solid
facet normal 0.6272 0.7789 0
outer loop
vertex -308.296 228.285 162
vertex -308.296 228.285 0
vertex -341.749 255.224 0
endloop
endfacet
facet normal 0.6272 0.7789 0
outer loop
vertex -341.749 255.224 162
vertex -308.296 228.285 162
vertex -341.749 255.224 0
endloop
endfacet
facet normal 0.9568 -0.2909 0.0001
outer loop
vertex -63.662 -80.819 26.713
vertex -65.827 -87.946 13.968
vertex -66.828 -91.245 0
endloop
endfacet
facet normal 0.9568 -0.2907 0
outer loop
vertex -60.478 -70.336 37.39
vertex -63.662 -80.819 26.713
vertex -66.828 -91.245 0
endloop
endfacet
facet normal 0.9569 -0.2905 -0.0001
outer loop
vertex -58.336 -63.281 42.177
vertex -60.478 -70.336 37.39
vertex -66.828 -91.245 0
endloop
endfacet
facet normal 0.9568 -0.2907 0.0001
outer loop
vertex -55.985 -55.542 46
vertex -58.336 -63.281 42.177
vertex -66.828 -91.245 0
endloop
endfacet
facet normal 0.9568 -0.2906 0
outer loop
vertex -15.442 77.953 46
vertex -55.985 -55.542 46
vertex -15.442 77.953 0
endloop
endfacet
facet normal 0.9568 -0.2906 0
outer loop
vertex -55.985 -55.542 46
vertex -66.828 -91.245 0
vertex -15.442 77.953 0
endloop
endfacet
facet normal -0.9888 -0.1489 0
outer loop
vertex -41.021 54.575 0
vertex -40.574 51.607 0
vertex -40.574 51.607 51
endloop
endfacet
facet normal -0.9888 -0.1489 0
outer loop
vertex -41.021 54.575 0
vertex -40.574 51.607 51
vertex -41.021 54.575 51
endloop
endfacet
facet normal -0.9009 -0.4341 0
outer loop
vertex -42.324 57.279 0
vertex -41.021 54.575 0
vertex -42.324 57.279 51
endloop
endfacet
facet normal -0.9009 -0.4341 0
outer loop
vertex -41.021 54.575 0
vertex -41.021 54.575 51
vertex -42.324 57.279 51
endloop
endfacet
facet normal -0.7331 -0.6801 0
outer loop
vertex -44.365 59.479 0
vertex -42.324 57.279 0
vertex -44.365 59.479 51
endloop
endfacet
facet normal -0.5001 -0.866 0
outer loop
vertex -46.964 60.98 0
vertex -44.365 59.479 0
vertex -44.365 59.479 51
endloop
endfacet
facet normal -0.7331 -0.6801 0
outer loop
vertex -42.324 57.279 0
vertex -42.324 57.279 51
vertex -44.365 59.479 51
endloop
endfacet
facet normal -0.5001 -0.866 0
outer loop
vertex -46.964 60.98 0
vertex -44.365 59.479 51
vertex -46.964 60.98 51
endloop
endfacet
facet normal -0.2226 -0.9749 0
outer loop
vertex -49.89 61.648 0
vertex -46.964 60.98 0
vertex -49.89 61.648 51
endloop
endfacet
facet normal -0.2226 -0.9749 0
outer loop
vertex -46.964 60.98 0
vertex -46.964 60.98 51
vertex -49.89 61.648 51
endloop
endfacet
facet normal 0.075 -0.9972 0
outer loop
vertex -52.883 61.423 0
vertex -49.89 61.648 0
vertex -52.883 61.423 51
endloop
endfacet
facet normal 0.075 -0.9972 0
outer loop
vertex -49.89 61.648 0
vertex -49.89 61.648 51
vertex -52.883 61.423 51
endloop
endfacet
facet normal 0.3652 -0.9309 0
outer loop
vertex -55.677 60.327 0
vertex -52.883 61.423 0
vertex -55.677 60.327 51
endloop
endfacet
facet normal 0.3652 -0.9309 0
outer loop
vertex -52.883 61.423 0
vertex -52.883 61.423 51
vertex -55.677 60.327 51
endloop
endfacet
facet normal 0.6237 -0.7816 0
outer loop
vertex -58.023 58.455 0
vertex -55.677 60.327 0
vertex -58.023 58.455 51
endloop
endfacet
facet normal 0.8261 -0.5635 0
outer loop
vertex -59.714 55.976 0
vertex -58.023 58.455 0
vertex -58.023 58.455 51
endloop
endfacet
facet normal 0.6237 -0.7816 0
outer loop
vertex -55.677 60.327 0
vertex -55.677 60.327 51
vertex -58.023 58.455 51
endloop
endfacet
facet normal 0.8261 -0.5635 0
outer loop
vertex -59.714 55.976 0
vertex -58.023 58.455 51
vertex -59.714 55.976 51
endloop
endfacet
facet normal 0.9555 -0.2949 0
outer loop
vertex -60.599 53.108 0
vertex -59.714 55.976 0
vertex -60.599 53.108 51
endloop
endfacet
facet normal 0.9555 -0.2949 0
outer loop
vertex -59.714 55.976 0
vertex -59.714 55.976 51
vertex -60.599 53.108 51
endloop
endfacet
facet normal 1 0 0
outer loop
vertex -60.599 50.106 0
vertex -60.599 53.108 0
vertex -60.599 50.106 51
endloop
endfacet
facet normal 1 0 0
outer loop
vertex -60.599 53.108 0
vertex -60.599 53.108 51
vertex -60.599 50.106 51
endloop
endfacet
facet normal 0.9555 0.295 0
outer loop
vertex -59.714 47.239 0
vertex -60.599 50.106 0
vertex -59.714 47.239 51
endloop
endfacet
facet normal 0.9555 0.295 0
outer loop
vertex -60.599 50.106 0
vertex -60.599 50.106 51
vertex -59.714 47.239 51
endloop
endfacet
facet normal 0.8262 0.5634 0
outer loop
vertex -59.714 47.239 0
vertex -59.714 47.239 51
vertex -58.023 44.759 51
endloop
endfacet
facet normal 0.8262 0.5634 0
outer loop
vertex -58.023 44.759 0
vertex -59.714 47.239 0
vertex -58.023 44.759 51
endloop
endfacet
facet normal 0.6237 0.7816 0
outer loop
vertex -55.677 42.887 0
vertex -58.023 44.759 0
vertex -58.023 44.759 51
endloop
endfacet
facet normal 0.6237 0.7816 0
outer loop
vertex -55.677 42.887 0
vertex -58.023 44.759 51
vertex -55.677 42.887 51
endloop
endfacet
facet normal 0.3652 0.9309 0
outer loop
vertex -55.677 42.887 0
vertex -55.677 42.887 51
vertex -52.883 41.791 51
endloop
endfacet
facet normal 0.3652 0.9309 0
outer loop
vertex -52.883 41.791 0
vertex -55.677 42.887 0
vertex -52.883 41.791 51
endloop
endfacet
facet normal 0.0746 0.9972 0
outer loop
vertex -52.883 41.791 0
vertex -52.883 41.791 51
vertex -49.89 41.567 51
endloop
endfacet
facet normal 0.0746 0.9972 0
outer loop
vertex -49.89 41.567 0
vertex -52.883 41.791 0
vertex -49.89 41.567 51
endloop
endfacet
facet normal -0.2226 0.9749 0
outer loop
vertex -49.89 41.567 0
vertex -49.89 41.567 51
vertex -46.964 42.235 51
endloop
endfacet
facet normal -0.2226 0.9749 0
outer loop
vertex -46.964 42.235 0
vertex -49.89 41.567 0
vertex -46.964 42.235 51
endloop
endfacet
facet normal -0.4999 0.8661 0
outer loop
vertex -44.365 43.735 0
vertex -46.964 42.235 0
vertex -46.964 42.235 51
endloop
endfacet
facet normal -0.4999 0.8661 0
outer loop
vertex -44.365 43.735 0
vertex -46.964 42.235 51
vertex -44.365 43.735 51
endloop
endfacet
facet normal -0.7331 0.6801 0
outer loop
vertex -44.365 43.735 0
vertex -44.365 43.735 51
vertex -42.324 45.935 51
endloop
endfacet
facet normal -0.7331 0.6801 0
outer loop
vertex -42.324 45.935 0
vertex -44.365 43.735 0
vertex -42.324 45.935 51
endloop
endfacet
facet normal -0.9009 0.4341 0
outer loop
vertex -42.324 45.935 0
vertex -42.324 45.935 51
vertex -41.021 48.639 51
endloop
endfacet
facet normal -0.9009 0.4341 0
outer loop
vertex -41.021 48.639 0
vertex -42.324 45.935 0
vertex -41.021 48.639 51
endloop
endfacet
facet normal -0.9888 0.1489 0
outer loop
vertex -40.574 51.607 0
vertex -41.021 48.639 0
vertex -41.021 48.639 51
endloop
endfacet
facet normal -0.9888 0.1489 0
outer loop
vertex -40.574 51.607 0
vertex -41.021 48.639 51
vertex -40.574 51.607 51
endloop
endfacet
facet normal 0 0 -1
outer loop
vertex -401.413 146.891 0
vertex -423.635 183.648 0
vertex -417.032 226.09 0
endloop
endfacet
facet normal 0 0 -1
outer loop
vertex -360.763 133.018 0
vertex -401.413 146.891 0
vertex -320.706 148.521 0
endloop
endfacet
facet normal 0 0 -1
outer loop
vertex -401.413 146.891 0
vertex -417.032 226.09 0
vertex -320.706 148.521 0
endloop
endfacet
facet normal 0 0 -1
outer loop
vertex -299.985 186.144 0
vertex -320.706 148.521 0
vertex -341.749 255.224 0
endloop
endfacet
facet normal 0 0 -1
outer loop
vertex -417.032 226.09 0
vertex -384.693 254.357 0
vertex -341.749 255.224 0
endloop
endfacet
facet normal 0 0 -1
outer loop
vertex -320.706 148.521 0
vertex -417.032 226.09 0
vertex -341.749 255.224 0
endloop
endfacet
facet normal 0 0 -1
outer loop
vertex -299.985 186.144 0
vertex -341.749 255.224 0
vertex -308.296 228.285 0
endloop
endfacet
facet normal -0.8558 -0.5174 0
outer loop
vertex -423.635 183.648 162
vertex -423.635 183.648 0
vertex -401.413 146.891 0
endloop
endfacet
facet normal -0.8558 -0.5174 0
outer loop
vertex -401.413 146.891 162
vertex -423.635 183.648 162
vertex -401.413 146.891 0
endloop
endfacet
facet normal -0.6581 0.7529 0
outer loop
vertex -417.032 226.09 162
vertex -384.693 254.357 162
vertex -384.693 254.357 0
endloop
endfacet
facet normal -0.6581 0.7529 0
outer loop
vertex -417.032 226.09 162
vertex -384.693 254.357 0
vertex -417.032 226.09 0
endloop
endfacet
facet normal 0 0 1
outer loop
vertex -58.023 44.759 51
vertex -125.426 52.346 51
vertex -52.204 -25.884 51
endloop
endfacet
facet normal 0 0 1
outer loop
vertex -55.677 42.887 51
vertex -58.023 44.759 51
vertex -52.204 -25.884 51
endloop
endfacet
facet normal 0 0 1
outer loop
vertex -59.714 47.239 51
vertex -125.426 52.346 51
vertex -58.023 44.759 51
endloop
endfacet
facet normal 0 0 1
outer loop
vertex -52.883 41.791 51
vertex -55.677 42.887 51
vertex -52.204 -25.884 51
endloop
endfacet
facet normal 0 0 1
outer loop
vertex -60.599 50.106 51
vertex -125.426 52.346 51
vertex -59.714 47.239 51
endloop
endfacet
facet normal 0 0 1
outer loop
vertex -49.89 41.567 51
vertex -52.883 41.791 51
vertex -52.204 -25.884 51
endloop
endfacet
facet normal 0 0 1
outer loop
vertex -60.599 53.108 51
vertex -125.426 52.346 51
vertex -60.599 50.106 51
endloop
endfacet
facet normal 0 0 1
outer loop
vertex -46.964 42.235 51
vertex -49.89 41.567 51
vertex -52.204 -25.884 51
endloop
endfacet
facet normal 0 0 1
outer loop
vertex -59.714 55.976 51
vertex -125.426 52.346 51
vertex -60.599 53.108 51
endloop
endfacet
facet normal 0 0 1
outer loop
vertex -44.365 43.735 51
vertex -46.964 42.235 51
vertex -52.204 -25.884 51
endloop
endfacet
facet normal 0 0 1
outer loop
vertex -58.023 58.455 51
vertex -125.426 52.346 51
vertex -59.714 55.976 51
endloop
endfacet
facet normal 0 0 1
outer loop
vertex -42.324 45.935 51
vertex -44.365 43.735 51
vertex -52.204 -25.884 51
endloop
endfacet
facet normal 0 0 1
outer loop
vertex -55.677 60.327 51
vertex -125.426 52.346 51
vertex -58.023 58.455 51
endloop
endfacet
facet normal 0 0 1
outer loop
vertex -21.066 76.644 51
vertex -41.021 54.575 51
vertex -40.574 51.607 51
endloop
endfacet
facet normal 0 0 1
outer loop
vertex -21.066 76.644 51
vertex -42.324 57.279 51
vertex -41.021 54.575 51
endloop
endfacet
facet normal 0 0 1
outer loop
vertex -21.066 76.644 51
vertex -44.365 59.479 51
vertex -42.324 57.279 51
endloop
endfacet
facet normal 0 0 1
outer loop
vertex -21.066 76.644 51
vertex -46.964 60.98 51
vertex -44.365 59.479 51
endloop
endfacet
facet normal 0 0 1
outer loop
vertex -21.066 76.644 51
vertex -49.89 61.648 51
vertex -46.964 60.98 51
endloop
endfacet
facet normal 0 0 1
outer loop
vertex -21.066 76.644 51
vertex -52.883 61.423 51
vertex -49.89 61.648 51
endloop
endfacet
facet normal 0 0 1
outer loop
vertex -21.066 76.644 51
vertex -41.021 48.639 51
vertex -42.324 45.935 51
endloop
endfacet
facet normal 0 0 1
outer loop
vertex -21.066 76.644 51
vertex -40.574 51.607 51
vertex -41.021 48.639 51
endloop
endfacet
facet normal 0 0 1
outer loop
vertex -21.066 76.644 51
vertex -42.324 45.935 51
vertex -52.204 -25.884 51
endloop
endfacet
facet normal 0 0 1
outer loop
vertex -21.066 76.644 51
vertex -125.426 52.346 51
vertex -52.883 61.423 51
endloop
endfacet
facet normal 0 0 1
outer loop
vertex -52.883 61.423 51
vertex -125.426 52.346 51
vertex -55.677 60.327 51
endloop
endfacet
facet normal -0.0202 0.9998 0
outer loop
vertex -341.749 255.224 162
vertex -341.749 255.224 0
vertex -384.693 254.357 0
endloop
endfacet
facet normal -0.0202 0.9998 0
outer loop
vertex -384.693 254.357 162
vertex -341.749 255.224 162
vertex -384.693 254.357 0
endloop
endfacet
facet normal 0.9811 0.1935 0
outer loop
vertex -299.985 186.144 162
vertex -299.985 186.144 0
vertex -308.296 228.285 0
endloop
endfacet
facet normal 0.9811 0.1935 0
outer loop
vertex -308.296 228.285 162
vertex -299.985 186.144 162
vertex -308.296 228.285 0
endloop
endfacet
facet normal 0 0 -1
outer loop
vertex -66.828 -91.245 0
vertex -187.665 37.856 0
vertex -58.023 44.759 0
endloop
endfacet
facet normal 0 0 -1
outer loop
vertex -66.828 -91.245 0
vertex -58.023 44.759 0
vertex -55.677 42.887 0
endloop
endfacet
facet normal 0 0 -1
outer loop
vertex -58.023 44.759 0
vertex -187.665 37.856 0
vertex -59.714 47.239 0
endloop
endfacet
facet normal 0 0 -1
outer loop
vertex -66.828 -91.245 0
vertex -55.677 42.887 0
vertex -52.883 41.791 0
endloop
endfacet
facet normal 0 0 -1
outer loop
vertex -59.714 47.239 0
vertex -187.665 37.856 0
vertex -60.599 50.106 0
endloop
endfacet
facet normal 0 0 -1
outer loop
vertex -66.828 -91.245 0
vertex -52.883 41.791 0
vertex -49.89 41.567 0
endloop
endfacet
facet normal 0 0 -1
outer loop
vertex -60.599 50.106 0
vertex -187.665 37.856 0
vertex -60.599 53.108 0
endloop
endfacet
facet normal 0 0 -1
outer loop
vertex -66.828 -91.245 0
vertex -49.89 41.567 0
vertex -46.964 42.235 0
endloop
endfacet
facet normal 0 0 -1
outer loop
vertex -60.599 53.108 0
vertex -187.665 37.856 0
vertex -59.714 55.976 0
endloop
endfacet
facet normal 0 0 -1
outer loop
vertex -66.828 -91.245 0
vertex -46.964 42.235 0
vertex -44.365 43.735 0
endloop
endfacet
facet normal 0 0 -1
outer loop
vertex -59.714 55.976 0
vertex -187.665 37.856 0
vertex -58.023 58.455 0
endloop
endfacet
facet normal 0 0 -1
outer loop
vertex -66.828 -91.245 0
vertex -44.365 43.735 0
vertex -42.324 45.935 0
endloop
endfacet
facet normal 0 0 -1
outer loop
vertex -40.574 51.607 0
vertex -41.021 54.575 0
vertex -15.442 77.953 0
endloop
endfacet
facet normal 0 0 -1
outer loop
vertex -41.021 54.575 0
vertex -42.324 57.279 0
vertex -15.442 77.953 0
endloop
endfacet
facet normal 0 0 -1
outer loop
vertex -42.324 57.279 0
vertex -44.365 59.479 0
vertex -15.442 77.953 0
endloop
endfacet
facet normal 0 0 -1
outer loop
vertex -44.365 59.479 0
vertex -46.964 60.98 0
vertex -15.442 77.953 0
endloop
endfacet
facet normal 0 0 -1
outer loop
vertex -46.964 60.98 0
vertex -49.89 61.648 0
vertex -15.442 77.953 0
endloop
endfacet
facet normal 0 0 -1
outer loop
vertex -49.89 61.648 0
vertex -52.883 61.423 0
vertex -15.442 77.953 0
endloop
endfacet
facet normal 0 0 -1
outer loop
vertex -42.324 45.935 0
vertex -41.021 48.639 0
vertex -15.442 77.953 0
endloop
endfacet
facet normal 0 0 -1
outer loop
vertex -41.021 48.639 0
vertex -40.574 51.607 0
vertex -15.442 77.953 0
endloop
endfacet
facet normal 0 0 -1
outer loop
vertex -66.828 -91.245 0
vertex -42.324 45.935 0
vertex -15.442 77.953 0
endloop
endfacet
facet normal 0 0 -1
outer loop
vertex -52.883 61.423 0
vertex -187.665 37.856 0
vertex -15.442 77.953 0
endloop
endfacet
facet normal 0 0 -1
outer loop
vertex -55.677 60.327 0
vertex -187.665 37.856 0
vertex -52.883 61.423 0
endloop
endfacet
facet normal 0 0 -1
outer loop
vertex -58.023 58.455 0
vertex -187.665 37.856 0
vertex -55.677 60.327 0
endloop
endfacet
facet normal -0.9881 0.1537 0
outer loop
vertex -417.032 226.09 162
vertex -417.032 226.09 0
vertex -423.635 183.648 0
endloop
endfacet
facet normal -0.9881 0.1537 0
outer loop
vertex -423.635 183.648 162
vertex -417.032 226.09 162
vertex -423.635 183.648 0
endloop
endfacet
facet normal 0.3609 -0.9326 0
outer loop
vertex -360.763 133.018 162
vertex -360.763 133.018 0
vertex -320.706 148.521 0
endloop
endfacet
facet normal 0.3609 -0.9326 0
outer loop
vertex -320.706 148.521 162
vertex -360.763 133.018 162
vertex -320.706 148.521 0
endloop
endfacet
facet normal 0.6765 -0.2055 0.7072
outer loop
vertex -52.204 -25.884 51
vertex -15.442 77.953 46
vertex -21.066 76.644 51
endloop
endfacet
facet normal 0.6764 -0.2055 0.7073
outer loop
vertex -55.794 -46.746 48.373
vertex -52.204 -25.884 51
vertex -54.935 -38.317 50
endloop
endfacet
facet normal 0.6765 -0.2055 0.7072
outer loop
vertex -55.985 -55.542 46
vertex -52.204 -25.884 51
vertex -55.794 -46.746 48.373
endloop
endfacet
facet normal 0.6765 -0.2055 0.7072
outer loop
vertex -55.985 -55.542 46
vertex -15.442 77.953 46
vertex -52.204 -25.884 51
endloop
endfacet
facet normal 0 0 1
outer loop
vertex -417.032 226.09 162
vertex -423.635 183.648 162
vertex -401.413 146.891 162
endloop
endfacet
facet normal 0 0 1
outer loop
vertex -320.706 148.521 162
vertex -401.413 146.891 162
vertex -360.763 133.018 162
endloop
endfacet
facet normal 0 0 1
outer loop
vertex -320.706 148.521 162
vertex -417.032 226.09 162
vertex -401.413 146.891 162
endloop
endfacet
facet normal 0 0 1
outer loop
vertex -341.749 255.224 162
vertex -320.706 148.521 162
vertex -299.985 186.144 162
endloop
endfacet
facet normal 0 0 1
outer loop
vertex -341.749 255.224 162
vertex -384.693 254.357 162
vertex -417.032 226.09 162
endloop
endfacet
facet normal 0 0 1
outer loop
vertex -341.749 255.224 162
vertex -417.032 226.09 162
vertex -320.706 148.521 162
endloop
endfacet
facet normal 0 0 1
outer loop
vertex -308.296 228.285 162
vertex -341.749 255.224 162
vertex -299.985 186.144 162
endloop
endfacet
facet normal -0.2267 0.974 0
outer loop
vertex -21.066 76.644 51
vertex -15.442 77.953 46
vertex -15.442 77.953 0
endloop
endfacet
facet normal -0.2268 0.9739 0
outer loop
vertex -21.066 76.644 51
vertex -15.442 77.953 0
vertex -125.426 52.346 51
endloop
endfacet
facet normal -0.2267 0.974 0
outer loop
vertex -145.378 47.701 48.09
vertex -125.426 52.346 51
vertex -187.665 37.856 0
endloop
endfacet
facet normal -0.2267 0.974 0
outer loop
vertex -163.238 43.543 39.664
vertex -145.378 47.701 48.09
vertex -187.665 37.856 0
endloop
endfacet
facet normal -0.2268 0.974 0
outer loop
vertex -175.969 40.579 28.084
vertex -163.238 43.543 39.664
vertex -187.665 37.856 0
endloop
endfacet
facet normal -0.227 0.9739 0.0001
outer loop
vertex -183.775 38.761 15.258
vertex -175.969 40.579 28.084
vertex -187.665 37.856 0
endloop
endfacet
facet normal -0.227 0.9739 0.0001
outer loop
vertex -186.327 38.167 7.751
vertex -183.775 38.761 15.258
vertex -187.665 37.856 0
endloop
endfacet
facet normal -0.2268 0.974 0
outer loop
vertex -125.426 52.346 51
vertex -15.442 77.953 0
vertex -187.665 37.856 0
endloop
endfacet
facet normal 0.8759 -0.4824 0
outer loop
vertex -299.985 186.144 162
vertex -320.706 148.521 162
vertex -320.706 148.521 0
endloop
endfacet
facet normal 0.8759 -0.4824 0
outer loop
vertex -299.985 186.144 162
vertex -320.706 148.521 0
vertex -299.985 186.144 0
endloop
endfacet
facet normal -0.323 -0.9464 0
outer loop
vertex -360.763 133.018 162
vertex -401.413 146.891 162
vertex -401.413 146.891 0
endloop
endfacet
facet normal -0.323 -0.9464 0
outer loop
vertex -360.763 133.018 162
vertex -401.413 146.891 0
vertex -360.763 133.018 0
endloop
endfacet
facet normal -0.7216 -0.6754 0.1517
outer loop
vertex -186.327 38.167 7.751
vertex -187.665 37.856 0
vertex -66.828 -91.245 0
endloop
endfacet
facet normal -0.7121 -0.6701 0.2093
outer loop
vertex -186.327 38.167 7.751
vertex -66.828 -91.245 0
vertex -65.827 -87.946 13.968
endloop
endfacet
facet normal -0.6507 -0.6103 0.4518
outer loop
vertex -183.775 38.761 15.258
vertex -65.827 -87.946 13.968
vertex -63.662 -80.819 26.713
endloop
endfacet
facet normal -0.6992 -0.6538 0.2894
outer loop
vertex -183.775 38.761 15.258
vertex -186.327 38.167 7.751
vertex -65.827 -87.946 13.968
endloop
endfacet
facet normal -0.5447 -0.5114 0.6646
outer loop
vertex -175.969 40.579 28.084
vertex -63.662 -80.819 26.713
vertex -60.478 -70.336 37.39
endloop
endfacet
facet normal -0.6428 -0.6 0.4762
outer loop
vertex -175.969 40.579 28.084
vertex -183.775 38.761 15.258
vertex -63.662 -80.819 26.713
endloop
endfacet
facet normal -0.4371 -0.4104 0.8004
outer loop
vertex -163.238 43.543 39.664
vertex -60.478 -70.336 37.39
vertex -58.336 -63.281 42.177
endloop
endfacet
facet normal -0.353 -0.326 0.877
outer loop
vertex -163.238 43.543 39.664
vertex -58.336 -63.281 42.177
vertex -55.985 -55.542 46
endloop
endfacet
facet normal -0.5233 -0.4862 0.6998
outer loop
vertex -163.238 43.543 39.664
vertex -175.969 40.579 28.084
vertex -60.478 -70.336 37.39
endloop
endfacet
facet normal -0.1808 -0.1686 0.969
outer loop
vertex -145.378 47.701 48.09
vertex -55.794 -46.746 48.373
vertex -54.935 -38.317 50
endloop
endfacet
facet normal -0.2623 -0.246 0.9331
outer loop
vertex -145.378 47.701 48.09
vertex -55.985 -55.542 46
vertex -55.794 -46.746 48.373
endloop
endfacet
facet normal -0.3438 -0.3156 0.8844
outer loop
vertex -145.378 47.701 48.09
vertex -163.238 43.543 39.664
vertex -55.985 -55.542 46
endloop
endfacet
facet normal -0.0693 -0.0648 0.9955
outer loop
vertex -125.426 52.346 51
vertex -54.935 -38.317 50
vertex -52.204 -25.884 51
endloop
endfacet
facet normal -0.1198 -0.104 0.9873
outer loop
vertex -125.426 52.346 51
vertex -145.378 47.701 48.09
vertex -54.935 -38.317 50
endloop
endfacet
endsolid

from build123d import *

# Parameters (mm, degrees)
F1_DEPTH    = 51
F2_T1_DEPTH = 202.5458455168
F3_T1_DEPTH = 447.7658767431
F4_R        = 10.0685716687
F5_DEPTH    = 111
F7_DEPTH    = 162


# Not quite as in the source:
# - a fillet or chamfer that OpenCascade refuses, or shapes differently, is made with other operations: its cross-section is extruded or revolved along the edge and cut away or added


with BuildPart() as f1:
    # F0 (on Top) → F1 (new body)
    with BuildSketch(Plane.XY):
        Polygon((-66.8284512856, -91.2451116348), (-15.4423944853, 77.9529200846), (-187.6652166247, 37.8555348143), align=None)
    extrude(amount=F1_DEPTH)

    # F2: chamfer of 5 on 1 edges, made by hand

    # F2_s2 → F2_t1 (cut)
    with BuildSketch(Plane(origin=(-34.7514003583, -114.42536957, 0), x_dir=(0, 0, 1), z_dir=(0.2905974261, 0.9568454086, 0))):
        Polygon((46, -37.428902193), (51, -42.428902193), (51, -37.428902193), align=None)
    extrude(amount=F2_T1_DEPTH, mode=Mode.SUBTRACT)

    # F3: fillet of radius 55.5269119346 on 1 edges, made by hand

    # F3_s2 → F3_t1 (cut)
    with BuildSketch(Plane(origin=(-201.066415005, 214.8171054023, 0), x_dir=(0, 0, 1), z_dir=(0.6833537183, -0.7300874576, 0))):
        with BuildLine():
            ThreePointArc((0, 111.1433004041), (36.3056938439, 93.4301560684), (51, 55.8012276445))
            Line((51, 55.8012276445), (51, 111.1433004041))
            Line((51, 111.1433004041), (0, 111.1433004041))
        make_face()
    extrude(amount=F3_T1_DEPTH, mode=Mode.SUBTRACT)

    # F4 (on face) → F5 (cut)
    with BuildSketch(Plane.XY.offset(51)):
        with Locations((-50.6426393986, 51.6071207821)):
            Circle(F4_R)
    extrude(amount=-F5_DEPTH, mode=Mode.SUBTRACT)


with BuildPart() as f7:
    # F6 (on Top) → F7 (new body)
    with BuildSketch(Plane.XY):
        Polygon((-360.7626209722, 133.0184859606), (-320.7055081859, 148.5207455781), (-299.9846399328, 186.1443811928), (-308.2955407554, 228.2848755603), (-341.7494477934, 255.2242230267), (-384.6929061449, 254.357203515), (-417.0321943839, 226.0895050905), (-423.6354001323, 183.6478980066), (-401.4128100338, 146.8912819037), align=None)
    extrude(amount=F7_DEPTH)


solid = Compound([f1.part, f7.part])
